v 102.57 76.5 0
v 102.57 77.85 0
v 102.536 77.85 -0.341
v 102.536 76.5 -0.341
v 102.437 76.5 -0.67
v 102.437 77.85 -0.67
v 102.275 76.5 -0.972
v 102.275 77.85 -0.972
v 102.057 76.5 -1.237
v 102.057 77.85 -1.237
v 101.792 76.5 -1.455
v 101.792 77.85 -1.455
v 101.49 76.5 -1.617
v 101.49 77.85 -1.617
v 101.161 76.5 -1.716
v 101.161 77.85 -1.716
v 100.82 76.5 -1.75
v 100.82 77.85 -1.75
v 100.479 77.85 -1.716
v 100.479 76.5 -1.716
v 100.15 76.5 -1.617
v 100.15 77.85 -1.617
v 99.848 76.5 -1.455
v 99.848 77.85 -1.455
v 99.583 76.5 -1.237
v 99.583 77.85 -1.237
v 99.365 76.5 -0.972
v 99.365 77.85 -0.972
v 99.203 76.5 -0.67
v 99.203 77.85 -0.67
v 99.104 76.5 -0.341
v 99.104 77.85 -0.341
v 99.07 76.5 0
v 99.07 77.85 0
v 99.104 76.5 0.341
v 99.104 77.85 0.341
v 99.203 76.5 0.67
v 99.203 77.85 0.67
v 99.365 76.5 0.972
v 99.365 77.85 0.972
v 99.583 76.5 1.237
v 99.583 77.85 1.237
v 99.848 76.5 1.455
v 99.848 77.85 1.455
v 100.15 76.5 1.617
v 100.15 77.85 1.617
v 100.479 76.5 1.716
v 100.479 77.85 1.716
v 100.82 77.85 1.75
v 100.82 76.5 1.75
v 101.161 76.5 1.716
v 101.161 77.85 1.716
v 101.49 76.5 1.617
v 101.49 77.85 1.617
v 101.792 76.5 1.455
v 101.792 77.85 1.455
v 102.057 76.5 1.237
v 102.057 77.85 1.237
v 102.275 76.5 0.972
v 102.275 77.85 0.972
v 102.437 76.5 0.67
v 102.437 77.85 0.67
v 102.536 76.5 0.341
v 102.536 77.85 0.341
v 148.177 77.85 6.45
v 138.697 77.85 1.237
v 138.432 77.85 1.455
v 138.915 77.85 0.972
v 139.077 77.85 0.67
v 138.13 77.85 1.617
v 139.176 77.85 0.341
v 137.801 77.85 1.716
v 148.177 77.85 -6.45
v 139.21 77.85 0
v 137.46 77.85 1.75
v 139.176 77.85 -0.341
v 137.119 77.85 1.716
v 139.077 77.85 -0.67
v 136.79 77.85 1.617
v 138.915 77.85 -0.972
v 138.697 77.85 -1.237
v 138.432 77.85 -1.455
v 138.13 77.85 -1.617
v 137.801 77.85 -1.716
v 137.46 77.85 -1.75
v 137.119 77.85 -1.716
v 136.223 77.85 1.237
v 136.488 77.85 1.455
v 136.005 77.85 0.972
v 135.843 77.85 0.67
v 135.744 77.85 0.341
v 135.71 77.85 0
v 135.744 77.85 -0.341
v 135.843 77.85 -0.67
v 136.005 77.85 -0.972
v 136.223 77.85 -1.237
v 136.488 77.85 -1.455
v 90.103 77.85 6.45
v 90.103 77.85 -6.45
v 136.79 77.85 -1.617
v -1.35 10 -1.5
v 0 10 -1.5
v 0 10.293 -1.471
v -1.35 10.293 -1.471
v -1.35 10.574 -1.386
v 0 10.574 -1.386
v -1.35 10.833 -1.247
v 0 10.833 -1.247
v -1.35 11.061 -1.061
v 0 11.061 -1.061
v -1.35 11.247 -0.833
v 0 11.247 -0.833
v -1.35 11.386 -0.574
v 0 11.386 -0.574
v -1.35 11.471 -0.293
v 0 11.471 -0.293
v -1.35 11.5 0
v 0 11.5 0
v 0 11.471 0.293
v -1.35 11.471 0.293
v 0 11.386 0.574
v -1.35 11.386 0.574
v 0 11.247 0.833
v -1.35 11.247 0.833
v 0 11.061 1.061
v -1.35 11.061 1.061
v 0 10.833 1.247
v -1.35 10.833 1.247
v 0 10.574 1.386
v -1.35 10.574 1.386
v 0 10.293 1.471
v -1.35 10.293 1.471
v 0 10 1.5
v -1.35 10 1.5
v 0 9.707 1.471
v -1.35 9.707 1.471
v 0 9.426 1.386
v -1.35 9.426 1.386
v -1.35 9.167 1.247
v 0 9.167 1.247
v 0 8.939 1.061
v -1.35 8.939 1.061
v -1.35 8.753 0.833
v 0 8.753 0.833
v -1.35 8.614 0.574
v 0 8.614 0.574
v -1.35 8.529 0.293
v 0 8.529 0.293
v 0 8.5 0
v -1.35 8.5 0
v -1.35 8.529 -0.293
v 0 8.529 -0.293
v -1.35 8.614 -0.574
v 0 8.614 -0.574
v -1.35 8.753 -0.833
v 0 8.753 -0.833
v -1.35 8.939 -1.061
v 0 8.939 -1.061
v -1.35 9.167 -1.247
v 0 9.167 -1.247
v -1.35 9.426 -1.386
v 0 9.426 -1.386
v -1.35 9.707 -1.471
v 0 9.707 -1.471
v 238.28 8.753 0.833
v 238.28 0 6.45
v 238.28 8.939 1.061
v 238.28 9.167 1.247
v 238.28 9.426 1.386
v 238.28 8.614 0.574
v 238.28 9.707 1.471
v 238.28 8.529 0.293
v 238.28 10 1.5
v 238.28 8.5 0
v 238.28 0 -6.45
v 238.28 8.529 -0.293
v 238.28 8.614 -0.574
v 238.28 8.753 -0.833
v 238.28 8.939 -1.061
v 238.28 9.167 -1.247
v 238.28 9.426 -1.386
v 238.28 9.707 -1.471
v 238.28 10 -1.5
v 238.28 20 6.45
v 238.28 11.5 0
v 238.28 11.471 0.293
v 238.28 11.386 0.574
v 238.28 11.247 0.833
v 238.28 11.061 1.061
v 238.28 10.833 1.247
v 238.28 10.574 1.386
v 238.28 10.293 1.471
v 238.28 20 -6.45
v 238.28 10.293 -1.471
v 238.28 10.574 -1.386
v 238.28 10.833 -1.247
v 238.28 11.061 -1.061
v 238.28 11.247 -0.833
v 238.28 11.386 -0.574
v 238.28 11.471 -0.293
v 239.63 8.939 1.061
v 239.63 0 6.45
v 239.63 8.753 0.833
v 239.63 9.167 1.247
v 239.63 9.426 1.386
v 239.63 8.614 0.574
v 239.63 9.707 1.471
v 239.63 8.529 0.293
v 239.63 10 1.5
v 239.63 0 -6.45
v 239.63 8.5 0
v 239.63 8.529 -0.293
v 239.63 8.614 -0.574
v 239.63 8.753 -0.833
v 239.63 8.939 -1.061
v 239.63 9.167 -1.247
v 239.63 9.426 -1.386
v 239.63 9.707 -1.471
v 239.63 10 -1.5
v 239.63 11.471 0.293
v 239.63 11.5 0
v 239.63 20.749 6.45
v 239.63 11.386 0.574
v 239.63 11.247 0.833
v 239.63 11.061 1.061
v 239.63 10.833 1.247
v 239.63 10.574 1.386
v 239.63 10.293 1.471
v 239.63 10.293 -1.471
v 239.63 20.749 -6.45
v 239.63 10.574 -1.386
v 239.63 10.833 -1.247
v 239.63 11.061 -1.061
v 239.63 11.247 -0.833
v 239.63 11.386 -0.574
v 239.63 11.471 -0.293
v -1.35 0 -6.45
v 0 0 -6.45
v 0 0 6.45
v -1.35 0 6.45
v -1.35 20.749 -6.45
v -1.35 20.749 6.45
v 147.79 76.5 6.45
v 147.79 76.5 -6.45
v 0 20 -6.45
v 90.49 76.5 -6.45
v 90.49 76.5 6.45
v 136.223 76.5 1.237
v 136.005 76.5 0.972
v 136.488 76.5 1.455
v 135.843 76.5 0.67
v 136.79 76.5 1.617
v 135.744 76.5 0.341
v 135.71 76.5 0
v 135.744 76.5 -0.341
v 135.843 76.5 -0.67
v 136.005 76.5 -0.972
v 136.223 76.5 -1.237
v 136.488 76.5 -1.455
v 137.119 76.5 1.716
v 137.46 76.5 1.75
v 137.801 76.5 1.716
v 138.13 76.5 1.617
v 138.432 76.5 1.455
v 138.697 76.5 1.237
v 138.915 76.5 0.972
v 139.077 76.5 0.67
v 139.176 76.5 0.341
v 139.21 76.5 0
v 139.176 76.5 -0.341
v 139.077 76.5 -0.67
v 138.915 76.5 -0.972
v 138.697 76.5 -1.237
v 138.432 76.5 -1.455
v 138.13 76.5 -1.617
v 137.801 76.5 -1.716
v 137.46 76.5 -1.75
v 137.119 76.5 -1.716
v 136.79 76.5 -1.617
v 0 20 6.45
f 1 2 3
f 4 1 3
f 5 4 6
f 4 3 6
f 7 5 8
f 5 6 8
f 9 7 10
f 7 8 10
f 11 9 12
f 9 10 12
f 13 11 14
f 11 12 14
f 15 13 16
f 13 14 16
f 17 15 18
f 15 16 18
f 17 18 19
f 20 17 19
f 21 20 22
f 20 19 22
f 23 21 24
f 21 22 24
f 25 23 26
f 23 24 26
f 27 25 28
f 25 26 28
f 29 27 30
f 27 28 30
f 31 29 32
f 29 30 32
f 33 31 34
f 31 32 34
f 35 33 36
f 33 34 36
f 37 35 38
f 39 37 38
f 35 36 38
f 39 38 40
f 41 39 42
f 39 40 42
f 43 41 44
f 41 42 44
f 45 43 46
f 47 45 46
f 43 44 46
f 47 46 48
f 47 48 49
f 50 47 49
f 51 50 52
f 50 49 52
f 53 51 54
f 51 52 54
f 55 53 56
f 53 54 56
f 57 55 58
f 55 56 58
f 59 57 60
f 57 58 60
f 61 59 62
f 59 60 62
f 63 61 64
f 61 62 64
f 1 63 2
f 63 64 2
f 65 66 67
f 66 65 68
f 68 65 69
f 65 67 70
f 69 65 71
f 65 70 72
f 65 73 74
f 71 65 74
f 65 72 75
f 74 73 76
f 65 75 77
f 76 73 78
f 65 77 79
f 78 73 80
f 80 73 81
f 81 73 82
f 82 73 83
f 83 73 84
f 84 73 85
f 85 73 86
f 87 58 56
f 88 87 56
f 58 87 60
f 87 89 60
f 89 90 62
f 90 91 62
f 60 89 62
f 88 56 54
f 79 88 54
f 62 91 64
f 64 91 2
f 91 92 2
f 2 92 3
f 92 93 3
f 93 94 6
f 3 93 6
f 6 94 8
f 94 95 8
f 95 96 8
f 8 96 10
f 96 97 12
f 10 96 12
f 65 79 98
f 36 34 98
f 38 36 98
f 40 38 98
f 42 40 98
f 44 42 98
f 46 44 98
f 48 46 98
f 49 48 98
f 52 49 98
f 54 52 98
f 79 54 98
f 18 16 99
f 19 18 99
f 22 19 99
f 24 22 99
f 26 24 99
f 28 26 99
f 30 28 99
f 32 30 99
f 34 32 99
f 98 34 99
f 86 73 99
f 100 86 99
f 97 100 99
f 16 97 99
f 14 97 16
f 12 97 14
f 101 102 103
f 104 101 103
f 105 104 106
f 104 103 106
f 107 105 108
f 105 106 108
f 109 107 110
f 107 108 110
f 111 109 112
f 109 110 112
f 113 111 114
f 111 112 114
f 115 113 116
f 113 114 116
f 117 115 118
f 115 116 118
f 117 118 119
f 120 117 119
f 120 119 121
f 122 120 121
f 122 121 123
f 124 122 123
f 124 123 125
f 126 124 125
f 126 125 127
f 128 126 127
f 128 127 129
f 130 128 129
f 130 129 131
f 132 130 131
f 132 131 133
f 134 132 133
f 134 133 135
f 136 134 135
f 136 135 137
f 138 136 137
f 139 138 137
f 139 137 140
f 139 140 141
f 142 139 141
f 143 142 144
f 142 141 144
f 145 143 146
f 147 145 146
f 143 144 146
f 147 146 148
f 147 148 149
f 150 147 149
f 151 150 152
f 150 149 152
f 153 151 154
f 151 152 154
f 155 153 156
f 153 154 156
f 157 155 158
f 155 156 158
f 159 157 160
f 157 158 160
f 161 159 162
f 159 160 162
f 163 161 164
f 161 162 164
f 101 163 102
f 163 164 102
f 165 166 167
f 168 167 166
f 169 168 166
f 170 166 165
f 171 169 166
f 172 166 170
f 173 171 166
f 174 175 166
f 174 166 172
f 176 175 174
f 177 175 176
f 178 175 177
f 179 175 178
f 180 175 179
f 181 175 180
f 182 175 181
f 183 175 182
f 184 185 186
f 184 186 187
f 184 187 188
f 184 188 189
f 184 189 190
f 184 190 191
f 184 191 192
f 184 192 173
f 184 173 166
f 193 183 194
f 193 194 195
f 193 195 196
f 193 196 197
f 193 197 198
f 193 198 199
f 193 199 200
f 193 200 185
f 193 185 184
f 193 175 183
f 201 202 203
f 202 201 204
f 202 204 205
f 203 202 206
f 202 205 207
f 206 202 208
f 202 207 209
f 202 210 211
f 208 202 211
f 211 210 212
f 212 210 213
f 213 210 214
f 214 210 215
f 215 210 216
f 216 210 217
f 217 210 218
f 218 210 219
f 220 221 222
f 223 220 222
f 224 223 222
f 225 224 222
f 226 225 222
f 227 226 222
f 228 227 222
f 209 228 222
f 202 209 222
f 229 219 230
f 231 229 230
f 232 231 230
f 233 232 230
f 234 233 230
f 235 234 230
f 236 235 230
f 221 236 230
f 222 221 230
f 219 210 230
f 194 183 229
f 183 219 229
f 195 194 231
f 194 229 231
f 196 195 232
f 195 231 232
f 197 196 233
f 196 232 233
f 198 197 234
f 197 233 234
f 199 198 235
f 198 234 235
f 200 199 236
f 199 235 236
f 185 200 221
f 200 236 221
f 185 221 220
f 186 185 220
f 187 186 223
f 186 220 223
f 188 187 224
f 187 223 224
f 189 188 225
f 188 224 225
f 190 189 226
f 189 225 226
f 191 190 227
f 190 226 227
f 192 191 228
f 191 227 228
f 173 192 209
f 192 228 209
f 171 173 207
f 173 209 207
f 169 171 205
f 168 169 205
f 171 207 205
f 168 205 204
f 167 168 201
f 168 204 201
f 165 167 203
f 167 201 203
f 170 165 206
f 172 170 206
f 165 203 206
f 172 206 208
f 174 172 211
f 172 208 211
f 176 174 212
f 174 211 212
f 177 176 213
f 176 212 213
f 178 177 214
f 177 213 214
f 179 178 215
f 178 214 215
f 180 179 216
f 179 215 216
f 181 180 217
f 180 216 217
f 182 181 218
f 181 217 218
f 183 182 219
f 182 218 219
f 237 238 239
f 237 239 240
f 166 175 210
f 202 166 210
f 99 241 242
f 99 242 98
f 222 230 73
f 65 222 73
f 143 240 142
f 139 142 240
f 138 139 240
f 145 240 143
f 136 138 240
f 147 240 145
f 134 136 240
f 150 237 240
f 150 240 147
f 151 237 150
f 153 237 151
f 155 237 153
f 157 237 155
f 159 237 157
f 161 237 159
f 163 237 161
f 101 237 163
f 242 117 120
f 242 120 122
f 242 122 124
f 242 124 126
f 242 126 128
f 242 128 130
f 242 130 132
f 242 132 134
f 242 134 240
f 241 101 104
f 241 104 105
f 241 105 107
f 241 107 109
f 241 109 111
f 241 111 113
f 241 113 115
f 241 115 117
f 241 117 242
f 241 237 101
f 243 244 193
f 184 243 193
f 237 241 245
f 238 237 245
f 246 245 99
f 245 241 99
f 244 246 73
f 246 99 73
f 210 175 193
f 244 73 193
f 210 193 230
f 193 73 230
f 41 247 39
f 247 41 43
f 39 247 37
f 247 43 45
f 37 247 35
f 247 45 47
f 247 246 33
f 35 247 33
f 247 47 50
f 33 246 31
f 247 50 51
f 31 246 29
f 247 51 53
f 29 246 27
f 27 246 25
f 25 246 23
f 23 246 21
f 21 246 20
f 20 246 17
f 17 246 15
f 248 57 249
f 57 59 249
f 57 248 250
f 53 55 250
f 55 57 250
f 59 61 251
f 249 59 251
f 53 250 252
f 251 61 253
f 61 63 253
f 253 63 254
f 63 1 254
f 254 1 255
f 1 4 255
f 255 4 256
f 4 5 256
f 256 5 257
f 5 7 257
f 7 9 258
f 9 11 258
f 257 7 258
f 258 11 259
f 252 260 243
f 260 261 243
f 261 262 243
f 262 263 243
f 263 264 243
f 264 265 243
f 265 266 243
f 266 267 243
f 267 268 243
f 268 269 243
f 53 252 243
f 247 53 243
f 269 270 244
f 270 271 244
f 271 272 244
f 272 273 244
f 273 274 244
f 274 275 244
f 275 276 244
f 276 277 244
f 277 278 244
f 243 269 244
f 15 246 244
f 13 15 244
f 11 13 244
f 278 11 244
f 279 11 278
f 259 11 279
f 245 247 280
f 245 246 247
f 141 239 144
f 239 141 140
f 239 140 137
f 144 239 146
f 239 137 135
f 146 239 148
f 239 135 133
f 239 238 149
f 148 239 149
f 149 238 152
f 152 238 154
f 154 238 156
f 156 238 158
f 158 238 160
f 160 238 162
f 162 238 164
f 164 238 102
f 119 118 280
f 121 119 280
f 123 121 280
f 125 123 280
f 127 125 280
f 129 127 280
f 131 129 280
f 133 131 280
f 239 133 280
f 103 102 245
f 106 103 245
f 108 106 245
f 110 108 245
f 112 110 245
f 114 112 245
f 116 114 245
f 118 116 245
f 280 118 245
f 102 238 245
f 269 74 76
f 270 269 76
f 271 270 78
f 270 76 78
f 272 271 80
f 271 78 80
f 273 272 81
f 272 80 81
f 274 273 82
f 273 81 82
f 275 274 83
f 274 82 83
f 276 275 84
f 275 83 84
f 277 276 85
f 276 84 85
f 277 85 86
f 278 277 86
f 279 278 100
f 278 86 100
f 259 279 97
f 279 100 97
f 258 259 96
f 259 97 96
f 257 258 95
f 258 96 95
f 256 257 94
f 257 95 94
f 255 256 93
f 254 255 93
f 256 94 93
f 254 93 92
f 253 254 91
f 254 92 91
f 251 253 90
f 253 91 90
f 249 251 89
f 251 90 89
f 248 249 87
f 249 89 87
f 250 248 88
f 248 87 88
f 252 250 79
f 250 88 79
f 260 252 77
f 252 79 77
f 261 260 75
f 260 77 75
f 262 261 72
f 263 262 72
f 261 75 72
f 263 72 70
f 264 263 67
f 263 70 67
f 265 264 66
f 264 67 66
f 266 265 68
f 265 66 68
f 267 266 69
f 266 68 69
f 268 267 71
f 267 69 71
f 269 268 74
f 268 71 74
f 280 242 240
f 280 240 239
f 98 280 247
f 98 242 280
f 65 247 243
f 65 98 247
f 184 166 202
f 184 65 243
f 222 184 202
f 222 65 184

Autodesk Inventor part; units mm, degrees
ref_plane "YZ Plane" through (0, 0, 0) normal (1, 0, 0) x (0, 1, 0)
ref_plane "XZ Plane" through (0, 0, 0) normal (0, 1, 0) x (-1, 0, 0)
ref_plane "XY Plane" through (0, 0, 0) normal (0, 0, 1) x (1, 0, 0)
sketch "Sketch1" plane through (0, 0, 0) normal (0, 0, 1) x (1, 0, 0)
  line L0 (0, 0) -> (-1.35, 0)
  line L1 (0, 0) -> (0, 20)
  line L2 (0, 20) -> (90.49, 20) construction
  line L3 (90.49, 20) -> (90.49, 76.5) construction
  line L4 (90.49, 76.5) -> (0, 20)
  line L5 (90.49, 76.5) -> (147.79, 76.5)
  line L6 (119.14, 76.5) -> (119.14, 94.3884) construction
  line L7 (-1.35, 0) -> (-1.35, 20.7486)
  line L8 (-1.35, 20.7486) -> (90.1032, 77.85)
  line L9 (119.14, 77.85) -> (90.1032, 77.85)
  line L10 (238.28, 0) -> (239.63, 0)
  line L11 (238.28, 0) -> (238.28, 20)
  line L12 (147.79, 76.5) -> (238.28, 20)
  line L13 (147.79, 76.5) -> (90.49, 76.5)
  line L14 (239.63, 0) -> (239.63, 20.7486)
  line L15 (239.63, 20.7486) -> (148.1768, 77.85)
  line L16 (119.14, 77.85) -> (148.1768, 77.85)
  dimension "d0" = 1.35
  dimension "d1" = 20
  dimension "d2" = 90.49
  dimension "d3" = 56.5
  dimension "d4" = 57.3
  dimension "d5" = 1.35
  dimension "d6" = 1.35
extrude "Extrusion1" add sketch "Sketch1" along normal mid plane 12.9
sketch "Sketch2" plane through (90.1032, 77.85, 6.45) normal (0, 1, 0) x (1, 0, 0)
  circle A0 centre (10.7168, 6.45) radius 1.75
  line L0 (10.7168, 6.45) -> (47.3568, 6.45)
  circle A1 centre (47.3568, 6.45) radius 1.75
  line L1 (0, 12.9) -> (58.0737, 12.9) projected
  point P0 (-90.1032, 6.45)
  point P1 (29.0368, 12.9)
  point P2 (29.0368, 6.45)
  dimension "d9" = 3.5
  dimension "d10" = 36.64
  dimension "d11" = 3.5
  dimension "d12" = 0
extrude "Extrusion2" cut sketch "Sketch2" against normal blind 12.9
sketch "Sketch4" plane through (239.63, 0, 6.45) normal (1, 0, 0) x (0, 0, -1)
  circle A0 centre (6.45, 10) radius 1.5
  point P0 (6.45, 0)
  dimension "d15" = 3
extrude "Extrusion3" cut sketch "Sketch4" against normal through all
properties part number "A-MainGear"
